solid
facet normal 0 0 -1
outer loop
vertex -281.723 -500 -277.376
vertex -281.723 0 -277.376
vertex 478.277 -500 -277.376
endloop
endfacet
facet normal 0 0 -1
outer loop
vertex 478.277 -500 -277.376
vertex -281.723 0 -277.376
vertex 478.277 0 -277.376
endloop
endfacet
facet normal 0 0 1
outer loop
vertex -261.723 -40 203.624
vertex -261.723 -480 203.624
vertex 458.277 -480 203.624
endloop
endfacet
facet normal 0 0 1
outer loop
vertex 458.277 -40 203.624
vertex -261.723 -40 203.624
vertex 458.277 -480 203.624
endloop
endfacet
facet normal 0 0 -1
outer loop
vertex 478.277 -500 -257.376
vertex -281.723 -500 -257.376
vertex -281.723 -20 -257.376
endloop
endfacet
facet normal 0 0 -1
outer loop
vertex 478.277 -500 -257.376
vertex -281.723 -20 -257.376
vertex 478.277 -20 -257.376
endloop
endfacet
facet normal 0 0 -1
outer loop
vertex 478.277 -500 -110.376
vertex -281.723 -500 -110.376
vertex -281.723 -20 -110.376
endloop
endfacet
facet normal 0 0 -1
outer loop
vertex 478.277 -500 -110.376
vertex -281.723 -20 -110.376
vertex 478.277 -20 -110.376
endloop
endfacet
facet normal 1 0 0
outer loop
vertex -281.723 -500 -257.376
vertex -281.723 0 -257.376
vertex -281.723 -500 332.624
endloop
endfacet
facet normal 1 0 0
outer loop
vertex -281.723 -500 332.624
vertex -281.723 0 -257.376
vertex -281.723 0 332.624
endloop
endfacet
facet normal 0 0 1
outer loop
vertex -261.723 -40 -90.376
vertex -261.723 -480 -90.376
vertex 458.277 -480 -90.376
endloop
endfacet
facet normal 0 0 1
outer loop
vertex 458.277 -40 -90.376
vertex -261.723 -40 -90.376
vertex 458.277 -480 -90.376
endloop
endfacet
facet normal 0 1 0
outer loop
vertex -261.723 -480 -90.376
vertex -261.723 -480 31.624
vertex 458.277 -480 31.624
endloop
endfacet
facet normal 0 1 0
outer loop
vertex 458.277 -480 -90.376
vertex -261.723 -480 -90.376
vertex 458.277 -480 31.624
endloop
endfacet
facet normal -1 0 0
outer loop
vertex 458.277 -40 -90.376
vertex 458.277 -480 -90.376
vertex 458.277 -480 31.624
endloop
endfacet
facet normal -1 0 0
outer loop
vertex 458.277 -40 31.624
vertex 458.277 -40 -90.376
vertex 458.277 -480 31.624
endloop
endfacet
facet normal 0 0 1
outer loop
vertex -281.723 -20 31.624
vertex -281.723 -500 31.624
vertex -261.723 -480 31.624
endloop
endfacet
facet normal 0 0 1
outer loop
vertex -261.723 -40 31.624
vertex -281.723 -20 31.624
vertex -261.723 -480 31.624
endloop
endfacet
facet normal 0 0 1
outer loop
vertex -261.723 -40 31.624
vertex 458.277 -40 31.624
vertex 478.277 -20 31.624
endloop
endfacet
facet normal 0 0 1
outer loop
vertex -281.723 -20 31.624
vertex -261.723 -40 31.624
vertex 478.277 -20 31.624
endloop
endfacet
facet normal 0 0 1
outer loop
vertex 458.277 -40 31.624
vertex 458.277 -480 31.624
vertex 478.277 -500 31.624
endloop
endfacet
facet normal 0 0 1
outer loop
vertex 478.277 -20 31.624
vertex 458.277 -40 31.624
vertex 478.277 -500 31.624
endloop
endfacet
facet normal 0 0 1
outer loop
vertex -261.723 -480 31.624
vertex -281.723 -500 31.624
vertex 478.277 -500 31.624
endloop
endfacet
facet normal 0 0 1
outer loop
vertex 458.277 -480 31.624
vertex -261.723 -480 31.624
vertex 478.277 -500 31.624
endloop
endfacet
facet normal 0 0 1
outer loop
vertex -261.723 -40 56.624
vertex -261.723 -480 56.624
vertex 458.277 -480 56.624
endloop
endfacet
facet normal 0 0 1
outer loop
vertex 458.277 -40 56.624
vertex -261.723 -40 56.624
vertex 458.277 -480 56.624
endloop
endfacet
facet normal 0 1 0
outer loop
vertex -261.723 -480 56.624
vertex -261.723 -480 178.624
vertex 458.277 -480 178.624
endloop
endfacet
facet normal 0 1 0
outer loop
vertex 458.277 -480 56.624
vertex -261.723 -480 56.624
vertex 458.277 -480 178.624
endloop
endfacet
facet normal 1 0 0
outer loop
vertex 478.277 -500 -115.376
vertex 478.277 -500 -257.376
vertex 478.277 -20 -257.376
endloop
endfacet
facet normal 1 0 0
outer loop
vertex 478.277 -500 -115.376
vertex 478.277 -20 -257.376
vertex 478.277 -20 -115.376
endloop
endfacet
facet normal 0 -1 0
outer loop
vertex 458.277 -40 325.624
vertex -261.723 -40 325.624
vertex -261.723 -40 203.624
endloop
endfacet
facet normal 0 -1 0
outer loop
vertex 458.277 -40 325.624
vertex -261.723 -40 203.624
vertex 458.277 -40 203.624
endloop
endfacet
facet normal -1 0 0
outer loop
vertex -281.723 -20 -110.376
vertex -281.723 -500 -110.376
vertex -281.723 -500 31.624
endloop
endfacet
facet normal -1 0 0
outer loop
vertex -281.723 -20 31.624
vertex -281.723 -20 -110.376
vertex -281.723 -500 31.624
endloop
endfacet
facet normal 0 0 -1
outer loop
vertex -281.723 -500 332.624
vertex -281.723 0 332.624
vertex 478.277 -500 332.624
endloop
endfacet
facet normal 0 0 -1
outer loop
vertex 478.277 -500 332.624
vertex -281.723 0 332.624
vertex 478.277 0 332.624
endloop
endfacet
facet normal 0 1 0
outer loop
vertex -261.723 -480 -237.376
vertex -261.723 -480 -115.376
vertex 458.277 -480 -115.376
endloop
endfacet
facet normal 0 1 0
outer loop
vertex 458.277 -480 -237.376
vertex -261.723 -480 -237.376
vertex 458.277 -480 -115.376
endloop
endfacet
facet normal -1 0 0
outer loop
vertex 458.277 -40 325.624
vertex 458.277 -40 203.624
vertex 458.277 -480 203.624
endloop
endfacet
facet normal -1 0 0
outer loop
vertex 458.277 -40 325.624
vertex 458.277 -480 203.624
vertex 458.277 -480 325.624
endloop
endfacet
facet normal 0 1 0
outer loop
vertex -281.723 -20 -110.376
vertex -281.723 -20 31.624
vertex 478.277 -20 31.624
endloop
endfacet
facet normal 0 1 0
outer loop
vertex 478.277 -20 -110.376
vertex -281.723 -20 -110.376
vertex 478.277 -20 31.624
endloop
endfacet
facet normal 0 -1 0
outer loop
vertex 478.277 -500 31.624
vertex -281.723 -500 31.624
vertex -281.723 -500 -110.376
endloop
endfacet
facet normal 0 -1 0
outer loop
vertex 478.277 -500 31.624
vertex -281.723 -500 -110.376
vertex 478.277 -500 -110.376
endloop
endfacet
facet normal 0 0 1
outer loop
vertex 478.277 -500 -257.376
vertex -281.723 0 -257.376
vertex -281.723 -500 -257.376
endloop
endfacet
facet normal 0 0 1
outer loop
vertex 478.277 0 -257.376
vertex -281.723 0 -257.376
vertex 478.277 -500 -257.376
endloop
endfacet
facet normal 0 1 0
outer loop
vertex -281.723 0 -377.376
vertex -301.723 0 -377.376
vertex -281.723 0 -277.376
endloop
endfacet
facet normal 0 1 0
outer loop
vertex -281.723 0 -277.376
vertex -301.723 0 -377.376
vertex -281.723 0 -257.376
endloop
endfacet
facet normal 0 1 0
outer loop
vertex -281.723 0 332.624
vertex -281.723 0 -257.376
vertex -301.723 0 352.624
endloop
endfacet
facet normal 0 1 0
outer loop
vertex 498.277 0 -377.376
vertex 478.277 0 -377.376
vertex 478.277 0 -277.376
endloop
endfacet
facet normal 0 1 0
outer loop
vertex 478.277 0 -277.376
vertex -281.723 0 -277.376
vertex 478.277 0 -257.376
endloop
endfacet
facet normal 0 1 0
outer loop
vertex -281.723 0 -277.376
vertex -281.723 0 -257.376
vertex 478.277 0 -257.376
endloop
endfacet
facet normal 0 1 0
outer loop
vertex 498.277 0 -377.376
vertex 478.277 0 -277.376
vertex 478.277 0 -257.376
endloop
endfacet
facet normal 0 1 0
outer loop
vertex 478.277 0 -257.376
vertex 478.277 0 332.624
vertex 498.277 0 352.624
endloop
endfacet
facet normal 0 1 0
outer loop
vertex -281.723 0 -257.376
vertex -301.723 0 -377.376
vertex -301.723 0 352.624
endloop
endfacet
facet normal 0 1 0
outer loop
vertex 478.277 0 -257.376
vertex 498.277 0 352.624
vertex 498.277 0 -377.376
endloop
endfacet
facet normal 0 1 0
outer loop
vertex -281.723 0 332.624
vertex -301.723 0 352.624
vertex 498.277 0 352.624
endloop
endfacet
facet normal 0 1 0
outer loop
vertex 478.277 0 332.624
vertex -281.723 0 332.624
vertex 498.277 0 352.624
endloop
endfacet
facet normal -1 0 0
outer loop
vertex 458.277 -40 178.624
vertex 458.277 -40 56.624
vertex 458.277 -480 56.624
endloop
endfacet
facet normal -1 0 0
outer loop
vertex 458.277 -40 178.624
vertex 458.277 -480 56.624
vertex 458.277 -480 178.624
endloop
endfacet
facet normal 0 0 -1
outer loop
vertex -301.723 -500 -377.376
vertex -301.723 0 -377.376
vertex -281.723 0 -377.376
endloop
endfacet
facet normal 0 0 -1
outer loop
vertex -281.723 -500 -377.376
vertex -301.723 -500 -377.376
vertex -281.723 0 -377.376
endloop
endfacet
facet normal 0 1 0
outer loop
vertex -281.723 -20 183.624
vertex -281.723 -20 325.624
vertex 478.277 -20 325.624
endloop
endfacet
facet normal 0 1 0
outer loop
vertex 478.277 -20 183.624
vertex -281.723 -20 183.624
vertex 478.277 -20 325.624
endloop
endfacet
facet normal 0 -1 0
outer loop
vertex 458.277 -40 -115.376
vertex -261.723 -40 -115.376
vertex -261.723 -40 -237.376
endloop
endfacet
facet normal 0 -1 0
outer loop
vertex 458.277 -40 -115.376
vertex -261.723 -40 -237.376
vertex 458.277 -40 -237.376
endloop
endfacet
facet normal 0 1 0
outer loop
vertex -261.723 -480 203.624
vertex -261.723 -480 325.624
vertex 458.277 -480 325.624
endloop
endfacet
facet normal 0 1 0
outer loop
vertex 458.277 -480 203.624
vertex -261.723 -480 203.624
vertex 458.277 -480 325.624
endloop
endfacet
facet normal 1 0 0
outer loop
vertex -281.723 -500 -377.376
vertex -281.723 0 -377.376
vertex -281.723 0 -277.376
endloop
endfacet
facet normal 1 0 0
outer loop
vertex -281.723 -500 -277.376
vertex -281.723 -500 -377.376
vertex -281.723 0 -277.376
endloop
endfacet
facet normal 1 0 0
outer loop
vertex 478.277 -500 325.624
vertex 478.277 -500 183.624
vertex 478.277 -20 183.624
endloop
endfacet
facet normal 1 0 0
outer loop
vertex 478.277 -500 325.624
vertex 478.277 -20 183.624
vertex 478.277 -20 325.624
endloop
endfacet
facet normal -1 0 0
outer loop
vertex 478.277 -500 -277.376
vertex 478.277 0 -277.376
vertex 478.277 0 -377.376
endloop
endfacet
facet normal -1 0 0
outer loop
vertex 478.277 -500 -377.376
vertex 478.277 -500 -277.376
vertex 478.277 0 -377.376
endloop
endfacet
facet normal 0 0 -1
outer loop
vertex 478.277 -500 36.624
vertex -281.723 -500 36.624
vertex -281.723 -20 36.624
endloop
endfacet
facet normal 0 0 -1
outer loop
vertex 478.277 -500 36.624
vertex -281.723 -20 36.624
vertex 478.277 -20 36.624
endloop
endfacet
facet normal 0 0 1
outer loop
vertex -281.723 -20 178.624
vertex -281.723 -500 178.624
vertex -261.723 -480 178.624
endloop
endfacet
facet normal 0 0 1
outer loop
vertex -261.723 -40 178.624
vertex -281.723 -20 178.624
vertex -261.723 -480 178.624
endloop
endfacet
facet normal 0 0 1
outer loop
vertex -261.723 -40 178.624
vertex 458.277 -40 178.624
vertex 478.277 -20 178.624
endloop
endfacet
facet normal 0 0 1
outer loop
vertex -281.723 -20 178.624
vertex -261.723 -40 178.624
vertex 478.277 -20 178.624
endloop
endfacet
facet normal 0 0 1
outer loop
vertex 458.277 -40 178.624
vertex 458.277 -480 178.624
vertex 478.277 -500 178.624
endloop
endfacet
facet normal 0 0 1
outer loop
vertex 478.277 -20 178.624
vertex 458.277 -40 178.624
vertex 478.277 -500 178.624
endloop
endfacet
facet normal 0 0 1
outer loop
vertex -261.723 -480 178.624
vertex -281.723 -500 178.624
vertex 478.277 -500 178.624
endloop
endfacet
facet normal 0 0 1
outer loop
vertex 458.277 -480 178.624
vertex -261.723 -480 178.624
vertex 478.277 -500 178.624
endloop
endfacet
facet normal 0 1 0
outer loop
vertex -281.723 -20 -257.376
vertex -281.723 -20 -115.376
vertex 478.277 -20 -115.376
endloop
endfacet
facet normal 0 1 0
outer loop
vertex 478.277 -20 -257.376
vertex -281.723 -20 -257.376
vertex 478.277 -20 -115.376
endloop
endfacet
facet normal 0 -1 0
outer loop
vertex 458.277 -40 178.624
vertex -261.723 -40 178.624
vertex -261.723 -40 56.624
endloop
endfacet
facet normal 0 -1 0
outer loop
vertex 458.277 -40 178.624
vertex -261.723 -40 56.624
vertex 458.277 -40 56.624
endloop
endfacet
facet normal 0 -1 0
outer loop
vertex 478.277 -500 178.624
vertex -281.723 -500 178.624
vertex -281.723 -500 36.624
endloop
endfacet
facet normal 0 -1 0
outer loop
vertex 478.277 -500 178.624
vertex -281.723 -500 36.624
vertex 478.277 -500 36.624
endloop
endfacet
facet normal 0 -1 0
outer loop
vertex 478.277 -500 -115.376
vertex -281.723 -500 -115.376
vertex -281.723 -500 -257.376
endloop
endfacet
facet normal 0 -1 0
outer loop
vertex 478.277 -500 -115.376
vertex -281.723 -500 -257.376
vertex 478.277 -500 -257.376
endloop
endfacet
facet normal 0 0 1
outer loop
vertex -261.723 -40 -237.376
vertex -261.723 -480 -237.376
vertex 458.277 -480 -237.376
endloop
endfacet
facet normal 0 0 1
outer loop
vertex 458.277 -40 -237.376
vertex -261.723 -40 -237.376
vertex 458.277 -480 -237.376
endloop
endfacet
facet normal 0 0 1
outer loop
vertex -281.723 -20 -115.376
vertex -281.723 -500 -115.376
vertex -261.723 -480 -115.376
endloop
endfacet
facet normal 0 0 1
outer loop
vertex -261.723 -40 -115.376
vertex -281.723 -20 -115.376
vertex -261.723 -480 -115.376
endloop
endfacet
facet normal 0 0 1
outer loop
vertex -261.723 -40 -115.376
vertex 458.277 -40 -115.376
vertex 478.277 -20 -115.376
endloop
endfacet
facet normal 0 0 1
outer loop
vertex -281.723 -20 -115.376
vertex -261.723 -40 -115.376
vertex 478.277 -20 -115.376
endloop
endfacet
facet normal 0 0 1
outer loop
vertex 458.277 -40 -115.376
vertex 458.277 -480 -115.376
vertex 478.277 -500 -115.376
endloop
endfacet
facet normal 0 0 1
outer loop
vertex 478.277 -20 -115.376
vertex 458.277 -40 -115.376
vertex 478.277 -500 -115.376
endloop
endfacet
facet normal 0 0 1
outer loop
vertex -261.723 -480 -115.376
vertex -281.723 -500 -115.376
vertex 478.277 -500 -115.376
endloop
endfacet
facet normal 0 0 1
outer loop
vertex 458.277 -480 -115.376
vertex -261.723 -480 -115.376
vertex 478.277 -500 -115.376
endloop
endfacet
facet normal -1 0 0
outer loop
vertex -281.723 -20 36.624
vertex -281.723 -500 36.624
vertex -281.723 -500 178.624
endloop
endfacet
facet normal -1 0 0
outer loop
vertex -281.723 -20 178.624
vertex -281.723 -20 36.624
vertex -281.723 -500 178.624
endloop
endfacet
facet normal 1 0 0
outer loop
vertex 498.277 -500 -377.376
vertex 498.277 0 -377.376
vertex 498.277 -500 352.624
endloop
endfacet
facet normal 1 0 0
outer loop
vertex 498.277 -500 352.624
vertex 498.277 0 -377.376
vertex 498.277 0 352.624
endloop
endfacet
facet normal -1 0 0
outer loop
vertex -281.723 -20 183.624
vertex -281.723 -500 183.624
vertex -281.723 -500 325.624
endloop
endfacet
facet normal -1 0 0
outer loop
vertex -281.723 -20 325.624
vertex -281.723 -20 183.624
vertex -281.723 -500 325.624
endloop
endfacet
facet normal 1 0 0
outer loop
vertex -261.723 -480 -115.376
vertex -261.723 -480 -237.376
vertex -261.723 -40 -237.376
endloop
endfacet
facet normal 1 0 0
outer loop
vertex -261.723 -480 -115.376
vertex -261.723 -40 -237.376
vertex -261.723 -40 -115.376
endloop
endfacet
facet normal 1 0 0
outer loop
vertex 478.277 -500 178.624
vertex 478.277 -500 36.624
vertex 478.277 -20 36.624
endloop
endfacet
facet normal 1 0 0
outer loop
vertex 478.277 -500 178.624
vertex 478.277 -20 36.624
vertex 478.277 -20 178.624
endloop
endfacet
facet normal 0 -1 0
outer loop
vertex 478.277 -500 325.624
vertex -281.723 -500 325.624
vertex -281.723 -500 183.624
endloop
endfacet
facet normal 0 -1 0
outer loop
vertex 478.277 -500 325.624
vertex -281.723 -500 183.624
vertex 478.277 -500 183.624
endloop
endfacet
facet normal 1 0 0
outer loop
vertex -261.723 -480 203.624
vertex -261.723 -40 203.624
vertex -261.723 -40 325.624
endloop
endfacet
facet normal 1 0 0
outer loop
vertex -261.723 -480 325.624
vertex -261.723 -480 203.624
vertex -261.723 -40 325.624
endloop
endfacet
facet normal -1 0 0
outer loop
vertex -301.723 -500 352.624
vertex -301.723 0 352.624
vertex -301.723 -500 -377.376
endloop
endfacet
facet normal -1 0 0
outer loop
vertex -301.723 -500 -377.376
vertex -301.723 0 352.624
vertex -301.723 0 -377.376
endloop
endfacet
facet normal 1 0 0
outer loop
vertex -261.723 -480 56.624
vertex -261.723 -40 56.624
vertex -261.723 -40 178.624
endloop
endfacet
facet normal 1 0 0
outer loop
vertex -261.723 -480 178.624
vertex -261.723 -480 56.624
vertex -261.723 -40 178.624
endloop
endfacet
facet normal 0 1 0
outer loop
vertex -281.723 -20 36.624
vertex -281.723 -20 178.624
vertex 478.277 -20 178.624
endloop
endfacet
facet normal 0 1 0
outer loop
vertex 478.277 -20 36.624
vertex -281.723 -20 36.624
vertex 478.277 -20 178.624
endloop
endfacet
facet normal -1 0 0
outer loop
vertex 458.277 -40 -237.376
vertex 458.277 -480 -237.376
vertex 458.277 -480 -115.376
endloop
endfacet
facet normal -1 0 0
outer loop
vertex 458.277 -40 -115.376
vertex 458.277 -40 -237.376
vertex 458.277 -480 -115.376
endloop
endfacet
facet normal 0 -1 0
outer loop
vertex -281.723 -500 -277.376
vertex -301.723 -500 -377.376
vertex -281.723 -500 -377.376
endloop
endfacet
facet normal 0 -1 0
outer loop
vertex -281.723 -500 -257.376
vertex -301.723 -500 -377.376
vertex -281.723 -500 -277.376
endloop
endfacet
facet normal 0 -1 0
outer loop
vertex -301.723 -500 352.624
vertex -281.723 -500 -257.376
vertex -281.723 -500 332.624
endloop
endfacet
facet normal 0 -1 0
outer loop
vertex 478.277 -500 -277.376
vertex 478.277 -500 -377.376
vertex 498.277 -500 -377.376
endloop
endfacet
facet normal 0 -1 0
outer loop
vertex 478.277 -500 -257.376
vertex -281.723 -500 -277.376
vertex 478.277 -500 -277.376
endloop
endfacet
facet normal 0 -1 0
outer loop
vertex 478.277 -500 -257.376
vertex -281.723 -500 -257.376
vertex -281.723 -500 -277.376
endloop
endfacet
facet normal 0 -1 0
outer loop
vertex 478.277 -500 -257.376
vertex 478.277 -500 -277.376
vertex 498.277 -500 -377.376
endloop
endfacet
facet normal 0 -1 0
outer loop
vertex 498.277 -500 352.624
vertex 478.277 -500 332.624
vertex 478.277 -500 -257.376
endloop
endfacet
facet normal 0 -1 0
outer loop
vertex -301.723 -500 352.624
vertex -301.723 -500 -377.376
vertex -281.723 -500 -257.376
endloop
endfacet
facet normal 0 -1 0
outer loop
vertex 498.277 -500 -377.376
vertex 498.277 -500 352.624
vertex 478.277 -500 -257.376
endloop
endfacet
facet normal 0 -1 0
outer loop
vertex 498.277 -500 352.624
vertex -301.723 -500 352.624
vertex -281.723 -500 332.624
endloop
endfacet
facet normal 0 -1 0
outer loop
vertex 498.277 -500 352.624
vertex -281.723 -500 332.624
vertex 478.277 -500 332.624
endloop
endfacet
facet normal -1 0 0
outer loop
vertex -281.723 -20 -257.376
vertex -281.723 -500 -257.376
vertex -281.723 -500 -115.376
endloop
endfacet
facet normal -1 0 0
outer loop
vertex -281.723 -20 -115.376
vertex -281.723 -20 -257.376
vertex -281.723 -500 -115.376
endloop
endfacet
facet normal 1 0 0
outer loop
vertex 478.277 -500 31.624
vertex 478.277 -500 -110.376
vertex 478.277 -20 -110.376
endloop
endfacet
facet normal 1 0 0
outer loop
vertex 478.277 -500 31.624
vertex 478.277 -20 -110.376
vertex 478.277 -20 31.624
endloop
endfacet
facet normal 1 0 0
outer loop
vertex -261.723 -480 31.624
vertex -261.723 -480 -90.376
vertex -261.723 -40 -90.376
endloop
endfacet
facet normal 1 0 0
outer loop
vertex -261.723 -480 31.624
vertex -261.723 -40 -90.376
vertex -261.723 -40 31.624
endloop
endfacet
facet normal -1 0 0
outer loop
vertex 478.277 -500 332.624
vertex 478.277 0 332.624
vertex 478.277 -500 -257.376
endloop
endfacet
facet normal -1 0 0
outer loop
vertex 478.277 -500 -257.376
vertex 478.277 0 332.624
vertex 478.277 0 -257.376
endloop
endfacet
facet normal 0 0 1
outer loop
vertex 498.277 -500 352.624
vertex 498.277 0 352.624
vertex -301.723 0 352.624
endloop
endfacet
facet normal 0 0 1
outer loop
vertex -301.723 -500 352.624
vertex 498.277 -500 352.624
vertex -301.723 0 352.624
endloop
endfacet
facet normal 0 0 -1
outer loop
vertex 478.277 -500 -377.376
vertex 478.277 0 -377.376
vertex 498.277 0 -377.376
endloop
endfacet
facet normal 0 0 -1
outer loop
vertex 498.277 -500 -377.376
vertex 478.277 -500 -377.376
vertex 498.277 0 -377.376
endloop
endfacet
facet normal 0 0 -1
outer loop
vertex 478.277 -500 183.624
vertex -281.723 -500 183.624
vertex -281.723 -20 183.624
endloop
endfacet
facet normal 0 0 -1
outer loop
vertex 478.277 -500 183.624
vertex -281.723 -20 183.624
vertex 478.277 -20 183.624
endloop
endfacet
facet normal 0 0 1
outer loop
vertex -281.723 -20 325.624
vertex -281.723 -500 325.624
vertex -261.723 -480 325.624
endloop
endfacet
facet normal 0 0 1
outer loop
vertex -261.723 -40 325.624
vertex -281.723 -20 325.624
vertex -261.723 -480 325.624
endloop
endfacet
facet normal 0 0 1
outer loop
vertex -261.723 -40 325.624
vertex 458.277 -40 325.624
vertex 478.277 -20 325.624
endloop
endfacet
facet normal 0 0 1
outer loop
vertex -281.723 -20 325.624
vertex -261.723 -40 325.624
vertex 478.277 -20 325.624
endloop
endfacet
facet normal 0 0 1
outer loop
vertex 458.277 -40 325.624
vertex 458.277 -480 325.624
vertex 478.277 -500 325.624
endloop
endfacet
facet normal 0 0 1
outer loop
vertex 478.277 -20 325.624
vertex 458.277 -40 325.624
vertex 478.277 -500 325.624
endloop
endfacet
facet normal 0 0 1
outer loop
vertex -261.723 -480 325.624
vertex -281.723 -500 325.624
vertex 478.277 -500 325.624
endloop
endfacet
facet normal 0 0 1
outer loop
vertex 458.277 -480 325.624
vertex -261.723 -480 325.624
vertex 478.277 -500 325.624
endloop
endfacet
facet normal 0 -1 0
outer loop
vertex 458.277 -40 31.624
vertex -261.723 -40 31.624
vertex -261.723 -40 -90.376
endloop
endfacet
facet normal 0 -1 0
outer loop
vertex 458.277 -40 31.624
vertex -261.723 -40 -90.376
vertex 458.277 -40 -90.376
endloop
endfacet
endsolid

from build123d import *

# Parameters (mm, degrees)
F0_W     = 760
F0_H     = 20
F1_DEPTH = 500
F2_W     = 760
F2_H     = 142
F3_DEPTH = 480
F4_T     = -20
F4_2_T   = -20
F4_3_T   = -20
F4_4_T   = -20


with BuildPart() as f1:
    # F0 (on Front) → F1 (new body)
    with BuildSketch(Plane.XZ):
        Polygon((-301.7233454305, 352.6241288904), (-301.7233454305, 332.6241288904), (-281.7233454305, 332.6241288904), (478.2766545695, 332.6241288904), (498.2766545695, 332.6241288904), (498.2766545695, 352.6241288904), align=None)
        Polygon((-281.7233454305, 332.6241288904), (-301.7233454305, 332.6241288904), (-301.7233454305, -377.3758711096), (-281.7233454305, -377.3758711096), (-281.7233454305, -277.3758711096), (-281.7233454305, -257.3758711096), align=None)
        with Locations((98.2766545695, -267.3758711096)):
            Rectangle(F0_W, F0_H)
        Polygon((498.2766545695, 332.6241288904), (478.2766545695, 332.6241288904), (478.2766545695, -257.3758711096), (478.2766545695, -277.3758711096), (478.2766545695, -377.3758711096), (498.2766545695, -377.3758711096), align=None)
    extrude(amount=F1_DEPTH)


with BuildPart() as f3:
    # F2 (on face) → F3 (new body)
    with BuildSketch(Plane.XZ.offset(500)):
        with Locations((98.2766545695, -186.3758711096)):
            Rectangle(F2_W, F2_H)
    extrude(amount=-F3_DEPTH)

    # F4#4
    f4_4_openings = [f3.faces().sort_by_distance(p)[0] for p in [
        (98.276655, -260, -115.375871),
    ]]
    offset(amount=F4_4_T, openings=f4_4_openings)


with BuildPart() as f3b:
    # F2 (on face) → F3, piece 2 (new body)
    with BuildSketch(Plane.XZ.offset(500)):
        with Locations((98.2766545695, -39.3758711096)):
            Rectangle(F2_W, F2_H)
    extrude(amount=-F3_DEPTH)

    # F4#3
    f4_3_openings = [f3b.faces().sort_by_distance(p)[0] for p in [
        (98.276655, -260, 31.624129),
    ]]
    offset(amount=F4_3_T, openings=f4_3_openings)


with BuildPart() as f3c:
    # F2 (on face) → F3, piece 3 (new body)
    with BuildSketch(Plane.XZ.offset(500)):
        with Locations((98.2766545695, 107.6241288904)):
            Rectangle(F2_W, F2_H)
    extrude(amount=-F3_DEPTH)

    # F4#2
    f4_2_openings = [f3c.faces().sort_by_distance(p)[0] for p in [
        (98.276655, -260, 178.624129),
    ]]
    offset(amount=F4_2_T, openings=f4_2_openings)


with BuildPart() as f3d:
    # F2 (on face) → F3, piece 4 (new body)
    with BuildSketch(Plane.XZ.offset(500)):
        with Locations((98.2766545695, 254.6241334677)):
            Rectangle(F2_W, F2_H)
    extrude(amount=-F3_DEPTH)

    # F4
    f4_openings = [f3d.faces().sort_by_distance(p)[0] for p in [
        (98.276655, -260, 325.624133),
    ]]
    offset(amount=F4_T, openings=f4_openings)


solid = Compound([f1.part, f3.part, f3b.part, f3c.part, f3d.part])
